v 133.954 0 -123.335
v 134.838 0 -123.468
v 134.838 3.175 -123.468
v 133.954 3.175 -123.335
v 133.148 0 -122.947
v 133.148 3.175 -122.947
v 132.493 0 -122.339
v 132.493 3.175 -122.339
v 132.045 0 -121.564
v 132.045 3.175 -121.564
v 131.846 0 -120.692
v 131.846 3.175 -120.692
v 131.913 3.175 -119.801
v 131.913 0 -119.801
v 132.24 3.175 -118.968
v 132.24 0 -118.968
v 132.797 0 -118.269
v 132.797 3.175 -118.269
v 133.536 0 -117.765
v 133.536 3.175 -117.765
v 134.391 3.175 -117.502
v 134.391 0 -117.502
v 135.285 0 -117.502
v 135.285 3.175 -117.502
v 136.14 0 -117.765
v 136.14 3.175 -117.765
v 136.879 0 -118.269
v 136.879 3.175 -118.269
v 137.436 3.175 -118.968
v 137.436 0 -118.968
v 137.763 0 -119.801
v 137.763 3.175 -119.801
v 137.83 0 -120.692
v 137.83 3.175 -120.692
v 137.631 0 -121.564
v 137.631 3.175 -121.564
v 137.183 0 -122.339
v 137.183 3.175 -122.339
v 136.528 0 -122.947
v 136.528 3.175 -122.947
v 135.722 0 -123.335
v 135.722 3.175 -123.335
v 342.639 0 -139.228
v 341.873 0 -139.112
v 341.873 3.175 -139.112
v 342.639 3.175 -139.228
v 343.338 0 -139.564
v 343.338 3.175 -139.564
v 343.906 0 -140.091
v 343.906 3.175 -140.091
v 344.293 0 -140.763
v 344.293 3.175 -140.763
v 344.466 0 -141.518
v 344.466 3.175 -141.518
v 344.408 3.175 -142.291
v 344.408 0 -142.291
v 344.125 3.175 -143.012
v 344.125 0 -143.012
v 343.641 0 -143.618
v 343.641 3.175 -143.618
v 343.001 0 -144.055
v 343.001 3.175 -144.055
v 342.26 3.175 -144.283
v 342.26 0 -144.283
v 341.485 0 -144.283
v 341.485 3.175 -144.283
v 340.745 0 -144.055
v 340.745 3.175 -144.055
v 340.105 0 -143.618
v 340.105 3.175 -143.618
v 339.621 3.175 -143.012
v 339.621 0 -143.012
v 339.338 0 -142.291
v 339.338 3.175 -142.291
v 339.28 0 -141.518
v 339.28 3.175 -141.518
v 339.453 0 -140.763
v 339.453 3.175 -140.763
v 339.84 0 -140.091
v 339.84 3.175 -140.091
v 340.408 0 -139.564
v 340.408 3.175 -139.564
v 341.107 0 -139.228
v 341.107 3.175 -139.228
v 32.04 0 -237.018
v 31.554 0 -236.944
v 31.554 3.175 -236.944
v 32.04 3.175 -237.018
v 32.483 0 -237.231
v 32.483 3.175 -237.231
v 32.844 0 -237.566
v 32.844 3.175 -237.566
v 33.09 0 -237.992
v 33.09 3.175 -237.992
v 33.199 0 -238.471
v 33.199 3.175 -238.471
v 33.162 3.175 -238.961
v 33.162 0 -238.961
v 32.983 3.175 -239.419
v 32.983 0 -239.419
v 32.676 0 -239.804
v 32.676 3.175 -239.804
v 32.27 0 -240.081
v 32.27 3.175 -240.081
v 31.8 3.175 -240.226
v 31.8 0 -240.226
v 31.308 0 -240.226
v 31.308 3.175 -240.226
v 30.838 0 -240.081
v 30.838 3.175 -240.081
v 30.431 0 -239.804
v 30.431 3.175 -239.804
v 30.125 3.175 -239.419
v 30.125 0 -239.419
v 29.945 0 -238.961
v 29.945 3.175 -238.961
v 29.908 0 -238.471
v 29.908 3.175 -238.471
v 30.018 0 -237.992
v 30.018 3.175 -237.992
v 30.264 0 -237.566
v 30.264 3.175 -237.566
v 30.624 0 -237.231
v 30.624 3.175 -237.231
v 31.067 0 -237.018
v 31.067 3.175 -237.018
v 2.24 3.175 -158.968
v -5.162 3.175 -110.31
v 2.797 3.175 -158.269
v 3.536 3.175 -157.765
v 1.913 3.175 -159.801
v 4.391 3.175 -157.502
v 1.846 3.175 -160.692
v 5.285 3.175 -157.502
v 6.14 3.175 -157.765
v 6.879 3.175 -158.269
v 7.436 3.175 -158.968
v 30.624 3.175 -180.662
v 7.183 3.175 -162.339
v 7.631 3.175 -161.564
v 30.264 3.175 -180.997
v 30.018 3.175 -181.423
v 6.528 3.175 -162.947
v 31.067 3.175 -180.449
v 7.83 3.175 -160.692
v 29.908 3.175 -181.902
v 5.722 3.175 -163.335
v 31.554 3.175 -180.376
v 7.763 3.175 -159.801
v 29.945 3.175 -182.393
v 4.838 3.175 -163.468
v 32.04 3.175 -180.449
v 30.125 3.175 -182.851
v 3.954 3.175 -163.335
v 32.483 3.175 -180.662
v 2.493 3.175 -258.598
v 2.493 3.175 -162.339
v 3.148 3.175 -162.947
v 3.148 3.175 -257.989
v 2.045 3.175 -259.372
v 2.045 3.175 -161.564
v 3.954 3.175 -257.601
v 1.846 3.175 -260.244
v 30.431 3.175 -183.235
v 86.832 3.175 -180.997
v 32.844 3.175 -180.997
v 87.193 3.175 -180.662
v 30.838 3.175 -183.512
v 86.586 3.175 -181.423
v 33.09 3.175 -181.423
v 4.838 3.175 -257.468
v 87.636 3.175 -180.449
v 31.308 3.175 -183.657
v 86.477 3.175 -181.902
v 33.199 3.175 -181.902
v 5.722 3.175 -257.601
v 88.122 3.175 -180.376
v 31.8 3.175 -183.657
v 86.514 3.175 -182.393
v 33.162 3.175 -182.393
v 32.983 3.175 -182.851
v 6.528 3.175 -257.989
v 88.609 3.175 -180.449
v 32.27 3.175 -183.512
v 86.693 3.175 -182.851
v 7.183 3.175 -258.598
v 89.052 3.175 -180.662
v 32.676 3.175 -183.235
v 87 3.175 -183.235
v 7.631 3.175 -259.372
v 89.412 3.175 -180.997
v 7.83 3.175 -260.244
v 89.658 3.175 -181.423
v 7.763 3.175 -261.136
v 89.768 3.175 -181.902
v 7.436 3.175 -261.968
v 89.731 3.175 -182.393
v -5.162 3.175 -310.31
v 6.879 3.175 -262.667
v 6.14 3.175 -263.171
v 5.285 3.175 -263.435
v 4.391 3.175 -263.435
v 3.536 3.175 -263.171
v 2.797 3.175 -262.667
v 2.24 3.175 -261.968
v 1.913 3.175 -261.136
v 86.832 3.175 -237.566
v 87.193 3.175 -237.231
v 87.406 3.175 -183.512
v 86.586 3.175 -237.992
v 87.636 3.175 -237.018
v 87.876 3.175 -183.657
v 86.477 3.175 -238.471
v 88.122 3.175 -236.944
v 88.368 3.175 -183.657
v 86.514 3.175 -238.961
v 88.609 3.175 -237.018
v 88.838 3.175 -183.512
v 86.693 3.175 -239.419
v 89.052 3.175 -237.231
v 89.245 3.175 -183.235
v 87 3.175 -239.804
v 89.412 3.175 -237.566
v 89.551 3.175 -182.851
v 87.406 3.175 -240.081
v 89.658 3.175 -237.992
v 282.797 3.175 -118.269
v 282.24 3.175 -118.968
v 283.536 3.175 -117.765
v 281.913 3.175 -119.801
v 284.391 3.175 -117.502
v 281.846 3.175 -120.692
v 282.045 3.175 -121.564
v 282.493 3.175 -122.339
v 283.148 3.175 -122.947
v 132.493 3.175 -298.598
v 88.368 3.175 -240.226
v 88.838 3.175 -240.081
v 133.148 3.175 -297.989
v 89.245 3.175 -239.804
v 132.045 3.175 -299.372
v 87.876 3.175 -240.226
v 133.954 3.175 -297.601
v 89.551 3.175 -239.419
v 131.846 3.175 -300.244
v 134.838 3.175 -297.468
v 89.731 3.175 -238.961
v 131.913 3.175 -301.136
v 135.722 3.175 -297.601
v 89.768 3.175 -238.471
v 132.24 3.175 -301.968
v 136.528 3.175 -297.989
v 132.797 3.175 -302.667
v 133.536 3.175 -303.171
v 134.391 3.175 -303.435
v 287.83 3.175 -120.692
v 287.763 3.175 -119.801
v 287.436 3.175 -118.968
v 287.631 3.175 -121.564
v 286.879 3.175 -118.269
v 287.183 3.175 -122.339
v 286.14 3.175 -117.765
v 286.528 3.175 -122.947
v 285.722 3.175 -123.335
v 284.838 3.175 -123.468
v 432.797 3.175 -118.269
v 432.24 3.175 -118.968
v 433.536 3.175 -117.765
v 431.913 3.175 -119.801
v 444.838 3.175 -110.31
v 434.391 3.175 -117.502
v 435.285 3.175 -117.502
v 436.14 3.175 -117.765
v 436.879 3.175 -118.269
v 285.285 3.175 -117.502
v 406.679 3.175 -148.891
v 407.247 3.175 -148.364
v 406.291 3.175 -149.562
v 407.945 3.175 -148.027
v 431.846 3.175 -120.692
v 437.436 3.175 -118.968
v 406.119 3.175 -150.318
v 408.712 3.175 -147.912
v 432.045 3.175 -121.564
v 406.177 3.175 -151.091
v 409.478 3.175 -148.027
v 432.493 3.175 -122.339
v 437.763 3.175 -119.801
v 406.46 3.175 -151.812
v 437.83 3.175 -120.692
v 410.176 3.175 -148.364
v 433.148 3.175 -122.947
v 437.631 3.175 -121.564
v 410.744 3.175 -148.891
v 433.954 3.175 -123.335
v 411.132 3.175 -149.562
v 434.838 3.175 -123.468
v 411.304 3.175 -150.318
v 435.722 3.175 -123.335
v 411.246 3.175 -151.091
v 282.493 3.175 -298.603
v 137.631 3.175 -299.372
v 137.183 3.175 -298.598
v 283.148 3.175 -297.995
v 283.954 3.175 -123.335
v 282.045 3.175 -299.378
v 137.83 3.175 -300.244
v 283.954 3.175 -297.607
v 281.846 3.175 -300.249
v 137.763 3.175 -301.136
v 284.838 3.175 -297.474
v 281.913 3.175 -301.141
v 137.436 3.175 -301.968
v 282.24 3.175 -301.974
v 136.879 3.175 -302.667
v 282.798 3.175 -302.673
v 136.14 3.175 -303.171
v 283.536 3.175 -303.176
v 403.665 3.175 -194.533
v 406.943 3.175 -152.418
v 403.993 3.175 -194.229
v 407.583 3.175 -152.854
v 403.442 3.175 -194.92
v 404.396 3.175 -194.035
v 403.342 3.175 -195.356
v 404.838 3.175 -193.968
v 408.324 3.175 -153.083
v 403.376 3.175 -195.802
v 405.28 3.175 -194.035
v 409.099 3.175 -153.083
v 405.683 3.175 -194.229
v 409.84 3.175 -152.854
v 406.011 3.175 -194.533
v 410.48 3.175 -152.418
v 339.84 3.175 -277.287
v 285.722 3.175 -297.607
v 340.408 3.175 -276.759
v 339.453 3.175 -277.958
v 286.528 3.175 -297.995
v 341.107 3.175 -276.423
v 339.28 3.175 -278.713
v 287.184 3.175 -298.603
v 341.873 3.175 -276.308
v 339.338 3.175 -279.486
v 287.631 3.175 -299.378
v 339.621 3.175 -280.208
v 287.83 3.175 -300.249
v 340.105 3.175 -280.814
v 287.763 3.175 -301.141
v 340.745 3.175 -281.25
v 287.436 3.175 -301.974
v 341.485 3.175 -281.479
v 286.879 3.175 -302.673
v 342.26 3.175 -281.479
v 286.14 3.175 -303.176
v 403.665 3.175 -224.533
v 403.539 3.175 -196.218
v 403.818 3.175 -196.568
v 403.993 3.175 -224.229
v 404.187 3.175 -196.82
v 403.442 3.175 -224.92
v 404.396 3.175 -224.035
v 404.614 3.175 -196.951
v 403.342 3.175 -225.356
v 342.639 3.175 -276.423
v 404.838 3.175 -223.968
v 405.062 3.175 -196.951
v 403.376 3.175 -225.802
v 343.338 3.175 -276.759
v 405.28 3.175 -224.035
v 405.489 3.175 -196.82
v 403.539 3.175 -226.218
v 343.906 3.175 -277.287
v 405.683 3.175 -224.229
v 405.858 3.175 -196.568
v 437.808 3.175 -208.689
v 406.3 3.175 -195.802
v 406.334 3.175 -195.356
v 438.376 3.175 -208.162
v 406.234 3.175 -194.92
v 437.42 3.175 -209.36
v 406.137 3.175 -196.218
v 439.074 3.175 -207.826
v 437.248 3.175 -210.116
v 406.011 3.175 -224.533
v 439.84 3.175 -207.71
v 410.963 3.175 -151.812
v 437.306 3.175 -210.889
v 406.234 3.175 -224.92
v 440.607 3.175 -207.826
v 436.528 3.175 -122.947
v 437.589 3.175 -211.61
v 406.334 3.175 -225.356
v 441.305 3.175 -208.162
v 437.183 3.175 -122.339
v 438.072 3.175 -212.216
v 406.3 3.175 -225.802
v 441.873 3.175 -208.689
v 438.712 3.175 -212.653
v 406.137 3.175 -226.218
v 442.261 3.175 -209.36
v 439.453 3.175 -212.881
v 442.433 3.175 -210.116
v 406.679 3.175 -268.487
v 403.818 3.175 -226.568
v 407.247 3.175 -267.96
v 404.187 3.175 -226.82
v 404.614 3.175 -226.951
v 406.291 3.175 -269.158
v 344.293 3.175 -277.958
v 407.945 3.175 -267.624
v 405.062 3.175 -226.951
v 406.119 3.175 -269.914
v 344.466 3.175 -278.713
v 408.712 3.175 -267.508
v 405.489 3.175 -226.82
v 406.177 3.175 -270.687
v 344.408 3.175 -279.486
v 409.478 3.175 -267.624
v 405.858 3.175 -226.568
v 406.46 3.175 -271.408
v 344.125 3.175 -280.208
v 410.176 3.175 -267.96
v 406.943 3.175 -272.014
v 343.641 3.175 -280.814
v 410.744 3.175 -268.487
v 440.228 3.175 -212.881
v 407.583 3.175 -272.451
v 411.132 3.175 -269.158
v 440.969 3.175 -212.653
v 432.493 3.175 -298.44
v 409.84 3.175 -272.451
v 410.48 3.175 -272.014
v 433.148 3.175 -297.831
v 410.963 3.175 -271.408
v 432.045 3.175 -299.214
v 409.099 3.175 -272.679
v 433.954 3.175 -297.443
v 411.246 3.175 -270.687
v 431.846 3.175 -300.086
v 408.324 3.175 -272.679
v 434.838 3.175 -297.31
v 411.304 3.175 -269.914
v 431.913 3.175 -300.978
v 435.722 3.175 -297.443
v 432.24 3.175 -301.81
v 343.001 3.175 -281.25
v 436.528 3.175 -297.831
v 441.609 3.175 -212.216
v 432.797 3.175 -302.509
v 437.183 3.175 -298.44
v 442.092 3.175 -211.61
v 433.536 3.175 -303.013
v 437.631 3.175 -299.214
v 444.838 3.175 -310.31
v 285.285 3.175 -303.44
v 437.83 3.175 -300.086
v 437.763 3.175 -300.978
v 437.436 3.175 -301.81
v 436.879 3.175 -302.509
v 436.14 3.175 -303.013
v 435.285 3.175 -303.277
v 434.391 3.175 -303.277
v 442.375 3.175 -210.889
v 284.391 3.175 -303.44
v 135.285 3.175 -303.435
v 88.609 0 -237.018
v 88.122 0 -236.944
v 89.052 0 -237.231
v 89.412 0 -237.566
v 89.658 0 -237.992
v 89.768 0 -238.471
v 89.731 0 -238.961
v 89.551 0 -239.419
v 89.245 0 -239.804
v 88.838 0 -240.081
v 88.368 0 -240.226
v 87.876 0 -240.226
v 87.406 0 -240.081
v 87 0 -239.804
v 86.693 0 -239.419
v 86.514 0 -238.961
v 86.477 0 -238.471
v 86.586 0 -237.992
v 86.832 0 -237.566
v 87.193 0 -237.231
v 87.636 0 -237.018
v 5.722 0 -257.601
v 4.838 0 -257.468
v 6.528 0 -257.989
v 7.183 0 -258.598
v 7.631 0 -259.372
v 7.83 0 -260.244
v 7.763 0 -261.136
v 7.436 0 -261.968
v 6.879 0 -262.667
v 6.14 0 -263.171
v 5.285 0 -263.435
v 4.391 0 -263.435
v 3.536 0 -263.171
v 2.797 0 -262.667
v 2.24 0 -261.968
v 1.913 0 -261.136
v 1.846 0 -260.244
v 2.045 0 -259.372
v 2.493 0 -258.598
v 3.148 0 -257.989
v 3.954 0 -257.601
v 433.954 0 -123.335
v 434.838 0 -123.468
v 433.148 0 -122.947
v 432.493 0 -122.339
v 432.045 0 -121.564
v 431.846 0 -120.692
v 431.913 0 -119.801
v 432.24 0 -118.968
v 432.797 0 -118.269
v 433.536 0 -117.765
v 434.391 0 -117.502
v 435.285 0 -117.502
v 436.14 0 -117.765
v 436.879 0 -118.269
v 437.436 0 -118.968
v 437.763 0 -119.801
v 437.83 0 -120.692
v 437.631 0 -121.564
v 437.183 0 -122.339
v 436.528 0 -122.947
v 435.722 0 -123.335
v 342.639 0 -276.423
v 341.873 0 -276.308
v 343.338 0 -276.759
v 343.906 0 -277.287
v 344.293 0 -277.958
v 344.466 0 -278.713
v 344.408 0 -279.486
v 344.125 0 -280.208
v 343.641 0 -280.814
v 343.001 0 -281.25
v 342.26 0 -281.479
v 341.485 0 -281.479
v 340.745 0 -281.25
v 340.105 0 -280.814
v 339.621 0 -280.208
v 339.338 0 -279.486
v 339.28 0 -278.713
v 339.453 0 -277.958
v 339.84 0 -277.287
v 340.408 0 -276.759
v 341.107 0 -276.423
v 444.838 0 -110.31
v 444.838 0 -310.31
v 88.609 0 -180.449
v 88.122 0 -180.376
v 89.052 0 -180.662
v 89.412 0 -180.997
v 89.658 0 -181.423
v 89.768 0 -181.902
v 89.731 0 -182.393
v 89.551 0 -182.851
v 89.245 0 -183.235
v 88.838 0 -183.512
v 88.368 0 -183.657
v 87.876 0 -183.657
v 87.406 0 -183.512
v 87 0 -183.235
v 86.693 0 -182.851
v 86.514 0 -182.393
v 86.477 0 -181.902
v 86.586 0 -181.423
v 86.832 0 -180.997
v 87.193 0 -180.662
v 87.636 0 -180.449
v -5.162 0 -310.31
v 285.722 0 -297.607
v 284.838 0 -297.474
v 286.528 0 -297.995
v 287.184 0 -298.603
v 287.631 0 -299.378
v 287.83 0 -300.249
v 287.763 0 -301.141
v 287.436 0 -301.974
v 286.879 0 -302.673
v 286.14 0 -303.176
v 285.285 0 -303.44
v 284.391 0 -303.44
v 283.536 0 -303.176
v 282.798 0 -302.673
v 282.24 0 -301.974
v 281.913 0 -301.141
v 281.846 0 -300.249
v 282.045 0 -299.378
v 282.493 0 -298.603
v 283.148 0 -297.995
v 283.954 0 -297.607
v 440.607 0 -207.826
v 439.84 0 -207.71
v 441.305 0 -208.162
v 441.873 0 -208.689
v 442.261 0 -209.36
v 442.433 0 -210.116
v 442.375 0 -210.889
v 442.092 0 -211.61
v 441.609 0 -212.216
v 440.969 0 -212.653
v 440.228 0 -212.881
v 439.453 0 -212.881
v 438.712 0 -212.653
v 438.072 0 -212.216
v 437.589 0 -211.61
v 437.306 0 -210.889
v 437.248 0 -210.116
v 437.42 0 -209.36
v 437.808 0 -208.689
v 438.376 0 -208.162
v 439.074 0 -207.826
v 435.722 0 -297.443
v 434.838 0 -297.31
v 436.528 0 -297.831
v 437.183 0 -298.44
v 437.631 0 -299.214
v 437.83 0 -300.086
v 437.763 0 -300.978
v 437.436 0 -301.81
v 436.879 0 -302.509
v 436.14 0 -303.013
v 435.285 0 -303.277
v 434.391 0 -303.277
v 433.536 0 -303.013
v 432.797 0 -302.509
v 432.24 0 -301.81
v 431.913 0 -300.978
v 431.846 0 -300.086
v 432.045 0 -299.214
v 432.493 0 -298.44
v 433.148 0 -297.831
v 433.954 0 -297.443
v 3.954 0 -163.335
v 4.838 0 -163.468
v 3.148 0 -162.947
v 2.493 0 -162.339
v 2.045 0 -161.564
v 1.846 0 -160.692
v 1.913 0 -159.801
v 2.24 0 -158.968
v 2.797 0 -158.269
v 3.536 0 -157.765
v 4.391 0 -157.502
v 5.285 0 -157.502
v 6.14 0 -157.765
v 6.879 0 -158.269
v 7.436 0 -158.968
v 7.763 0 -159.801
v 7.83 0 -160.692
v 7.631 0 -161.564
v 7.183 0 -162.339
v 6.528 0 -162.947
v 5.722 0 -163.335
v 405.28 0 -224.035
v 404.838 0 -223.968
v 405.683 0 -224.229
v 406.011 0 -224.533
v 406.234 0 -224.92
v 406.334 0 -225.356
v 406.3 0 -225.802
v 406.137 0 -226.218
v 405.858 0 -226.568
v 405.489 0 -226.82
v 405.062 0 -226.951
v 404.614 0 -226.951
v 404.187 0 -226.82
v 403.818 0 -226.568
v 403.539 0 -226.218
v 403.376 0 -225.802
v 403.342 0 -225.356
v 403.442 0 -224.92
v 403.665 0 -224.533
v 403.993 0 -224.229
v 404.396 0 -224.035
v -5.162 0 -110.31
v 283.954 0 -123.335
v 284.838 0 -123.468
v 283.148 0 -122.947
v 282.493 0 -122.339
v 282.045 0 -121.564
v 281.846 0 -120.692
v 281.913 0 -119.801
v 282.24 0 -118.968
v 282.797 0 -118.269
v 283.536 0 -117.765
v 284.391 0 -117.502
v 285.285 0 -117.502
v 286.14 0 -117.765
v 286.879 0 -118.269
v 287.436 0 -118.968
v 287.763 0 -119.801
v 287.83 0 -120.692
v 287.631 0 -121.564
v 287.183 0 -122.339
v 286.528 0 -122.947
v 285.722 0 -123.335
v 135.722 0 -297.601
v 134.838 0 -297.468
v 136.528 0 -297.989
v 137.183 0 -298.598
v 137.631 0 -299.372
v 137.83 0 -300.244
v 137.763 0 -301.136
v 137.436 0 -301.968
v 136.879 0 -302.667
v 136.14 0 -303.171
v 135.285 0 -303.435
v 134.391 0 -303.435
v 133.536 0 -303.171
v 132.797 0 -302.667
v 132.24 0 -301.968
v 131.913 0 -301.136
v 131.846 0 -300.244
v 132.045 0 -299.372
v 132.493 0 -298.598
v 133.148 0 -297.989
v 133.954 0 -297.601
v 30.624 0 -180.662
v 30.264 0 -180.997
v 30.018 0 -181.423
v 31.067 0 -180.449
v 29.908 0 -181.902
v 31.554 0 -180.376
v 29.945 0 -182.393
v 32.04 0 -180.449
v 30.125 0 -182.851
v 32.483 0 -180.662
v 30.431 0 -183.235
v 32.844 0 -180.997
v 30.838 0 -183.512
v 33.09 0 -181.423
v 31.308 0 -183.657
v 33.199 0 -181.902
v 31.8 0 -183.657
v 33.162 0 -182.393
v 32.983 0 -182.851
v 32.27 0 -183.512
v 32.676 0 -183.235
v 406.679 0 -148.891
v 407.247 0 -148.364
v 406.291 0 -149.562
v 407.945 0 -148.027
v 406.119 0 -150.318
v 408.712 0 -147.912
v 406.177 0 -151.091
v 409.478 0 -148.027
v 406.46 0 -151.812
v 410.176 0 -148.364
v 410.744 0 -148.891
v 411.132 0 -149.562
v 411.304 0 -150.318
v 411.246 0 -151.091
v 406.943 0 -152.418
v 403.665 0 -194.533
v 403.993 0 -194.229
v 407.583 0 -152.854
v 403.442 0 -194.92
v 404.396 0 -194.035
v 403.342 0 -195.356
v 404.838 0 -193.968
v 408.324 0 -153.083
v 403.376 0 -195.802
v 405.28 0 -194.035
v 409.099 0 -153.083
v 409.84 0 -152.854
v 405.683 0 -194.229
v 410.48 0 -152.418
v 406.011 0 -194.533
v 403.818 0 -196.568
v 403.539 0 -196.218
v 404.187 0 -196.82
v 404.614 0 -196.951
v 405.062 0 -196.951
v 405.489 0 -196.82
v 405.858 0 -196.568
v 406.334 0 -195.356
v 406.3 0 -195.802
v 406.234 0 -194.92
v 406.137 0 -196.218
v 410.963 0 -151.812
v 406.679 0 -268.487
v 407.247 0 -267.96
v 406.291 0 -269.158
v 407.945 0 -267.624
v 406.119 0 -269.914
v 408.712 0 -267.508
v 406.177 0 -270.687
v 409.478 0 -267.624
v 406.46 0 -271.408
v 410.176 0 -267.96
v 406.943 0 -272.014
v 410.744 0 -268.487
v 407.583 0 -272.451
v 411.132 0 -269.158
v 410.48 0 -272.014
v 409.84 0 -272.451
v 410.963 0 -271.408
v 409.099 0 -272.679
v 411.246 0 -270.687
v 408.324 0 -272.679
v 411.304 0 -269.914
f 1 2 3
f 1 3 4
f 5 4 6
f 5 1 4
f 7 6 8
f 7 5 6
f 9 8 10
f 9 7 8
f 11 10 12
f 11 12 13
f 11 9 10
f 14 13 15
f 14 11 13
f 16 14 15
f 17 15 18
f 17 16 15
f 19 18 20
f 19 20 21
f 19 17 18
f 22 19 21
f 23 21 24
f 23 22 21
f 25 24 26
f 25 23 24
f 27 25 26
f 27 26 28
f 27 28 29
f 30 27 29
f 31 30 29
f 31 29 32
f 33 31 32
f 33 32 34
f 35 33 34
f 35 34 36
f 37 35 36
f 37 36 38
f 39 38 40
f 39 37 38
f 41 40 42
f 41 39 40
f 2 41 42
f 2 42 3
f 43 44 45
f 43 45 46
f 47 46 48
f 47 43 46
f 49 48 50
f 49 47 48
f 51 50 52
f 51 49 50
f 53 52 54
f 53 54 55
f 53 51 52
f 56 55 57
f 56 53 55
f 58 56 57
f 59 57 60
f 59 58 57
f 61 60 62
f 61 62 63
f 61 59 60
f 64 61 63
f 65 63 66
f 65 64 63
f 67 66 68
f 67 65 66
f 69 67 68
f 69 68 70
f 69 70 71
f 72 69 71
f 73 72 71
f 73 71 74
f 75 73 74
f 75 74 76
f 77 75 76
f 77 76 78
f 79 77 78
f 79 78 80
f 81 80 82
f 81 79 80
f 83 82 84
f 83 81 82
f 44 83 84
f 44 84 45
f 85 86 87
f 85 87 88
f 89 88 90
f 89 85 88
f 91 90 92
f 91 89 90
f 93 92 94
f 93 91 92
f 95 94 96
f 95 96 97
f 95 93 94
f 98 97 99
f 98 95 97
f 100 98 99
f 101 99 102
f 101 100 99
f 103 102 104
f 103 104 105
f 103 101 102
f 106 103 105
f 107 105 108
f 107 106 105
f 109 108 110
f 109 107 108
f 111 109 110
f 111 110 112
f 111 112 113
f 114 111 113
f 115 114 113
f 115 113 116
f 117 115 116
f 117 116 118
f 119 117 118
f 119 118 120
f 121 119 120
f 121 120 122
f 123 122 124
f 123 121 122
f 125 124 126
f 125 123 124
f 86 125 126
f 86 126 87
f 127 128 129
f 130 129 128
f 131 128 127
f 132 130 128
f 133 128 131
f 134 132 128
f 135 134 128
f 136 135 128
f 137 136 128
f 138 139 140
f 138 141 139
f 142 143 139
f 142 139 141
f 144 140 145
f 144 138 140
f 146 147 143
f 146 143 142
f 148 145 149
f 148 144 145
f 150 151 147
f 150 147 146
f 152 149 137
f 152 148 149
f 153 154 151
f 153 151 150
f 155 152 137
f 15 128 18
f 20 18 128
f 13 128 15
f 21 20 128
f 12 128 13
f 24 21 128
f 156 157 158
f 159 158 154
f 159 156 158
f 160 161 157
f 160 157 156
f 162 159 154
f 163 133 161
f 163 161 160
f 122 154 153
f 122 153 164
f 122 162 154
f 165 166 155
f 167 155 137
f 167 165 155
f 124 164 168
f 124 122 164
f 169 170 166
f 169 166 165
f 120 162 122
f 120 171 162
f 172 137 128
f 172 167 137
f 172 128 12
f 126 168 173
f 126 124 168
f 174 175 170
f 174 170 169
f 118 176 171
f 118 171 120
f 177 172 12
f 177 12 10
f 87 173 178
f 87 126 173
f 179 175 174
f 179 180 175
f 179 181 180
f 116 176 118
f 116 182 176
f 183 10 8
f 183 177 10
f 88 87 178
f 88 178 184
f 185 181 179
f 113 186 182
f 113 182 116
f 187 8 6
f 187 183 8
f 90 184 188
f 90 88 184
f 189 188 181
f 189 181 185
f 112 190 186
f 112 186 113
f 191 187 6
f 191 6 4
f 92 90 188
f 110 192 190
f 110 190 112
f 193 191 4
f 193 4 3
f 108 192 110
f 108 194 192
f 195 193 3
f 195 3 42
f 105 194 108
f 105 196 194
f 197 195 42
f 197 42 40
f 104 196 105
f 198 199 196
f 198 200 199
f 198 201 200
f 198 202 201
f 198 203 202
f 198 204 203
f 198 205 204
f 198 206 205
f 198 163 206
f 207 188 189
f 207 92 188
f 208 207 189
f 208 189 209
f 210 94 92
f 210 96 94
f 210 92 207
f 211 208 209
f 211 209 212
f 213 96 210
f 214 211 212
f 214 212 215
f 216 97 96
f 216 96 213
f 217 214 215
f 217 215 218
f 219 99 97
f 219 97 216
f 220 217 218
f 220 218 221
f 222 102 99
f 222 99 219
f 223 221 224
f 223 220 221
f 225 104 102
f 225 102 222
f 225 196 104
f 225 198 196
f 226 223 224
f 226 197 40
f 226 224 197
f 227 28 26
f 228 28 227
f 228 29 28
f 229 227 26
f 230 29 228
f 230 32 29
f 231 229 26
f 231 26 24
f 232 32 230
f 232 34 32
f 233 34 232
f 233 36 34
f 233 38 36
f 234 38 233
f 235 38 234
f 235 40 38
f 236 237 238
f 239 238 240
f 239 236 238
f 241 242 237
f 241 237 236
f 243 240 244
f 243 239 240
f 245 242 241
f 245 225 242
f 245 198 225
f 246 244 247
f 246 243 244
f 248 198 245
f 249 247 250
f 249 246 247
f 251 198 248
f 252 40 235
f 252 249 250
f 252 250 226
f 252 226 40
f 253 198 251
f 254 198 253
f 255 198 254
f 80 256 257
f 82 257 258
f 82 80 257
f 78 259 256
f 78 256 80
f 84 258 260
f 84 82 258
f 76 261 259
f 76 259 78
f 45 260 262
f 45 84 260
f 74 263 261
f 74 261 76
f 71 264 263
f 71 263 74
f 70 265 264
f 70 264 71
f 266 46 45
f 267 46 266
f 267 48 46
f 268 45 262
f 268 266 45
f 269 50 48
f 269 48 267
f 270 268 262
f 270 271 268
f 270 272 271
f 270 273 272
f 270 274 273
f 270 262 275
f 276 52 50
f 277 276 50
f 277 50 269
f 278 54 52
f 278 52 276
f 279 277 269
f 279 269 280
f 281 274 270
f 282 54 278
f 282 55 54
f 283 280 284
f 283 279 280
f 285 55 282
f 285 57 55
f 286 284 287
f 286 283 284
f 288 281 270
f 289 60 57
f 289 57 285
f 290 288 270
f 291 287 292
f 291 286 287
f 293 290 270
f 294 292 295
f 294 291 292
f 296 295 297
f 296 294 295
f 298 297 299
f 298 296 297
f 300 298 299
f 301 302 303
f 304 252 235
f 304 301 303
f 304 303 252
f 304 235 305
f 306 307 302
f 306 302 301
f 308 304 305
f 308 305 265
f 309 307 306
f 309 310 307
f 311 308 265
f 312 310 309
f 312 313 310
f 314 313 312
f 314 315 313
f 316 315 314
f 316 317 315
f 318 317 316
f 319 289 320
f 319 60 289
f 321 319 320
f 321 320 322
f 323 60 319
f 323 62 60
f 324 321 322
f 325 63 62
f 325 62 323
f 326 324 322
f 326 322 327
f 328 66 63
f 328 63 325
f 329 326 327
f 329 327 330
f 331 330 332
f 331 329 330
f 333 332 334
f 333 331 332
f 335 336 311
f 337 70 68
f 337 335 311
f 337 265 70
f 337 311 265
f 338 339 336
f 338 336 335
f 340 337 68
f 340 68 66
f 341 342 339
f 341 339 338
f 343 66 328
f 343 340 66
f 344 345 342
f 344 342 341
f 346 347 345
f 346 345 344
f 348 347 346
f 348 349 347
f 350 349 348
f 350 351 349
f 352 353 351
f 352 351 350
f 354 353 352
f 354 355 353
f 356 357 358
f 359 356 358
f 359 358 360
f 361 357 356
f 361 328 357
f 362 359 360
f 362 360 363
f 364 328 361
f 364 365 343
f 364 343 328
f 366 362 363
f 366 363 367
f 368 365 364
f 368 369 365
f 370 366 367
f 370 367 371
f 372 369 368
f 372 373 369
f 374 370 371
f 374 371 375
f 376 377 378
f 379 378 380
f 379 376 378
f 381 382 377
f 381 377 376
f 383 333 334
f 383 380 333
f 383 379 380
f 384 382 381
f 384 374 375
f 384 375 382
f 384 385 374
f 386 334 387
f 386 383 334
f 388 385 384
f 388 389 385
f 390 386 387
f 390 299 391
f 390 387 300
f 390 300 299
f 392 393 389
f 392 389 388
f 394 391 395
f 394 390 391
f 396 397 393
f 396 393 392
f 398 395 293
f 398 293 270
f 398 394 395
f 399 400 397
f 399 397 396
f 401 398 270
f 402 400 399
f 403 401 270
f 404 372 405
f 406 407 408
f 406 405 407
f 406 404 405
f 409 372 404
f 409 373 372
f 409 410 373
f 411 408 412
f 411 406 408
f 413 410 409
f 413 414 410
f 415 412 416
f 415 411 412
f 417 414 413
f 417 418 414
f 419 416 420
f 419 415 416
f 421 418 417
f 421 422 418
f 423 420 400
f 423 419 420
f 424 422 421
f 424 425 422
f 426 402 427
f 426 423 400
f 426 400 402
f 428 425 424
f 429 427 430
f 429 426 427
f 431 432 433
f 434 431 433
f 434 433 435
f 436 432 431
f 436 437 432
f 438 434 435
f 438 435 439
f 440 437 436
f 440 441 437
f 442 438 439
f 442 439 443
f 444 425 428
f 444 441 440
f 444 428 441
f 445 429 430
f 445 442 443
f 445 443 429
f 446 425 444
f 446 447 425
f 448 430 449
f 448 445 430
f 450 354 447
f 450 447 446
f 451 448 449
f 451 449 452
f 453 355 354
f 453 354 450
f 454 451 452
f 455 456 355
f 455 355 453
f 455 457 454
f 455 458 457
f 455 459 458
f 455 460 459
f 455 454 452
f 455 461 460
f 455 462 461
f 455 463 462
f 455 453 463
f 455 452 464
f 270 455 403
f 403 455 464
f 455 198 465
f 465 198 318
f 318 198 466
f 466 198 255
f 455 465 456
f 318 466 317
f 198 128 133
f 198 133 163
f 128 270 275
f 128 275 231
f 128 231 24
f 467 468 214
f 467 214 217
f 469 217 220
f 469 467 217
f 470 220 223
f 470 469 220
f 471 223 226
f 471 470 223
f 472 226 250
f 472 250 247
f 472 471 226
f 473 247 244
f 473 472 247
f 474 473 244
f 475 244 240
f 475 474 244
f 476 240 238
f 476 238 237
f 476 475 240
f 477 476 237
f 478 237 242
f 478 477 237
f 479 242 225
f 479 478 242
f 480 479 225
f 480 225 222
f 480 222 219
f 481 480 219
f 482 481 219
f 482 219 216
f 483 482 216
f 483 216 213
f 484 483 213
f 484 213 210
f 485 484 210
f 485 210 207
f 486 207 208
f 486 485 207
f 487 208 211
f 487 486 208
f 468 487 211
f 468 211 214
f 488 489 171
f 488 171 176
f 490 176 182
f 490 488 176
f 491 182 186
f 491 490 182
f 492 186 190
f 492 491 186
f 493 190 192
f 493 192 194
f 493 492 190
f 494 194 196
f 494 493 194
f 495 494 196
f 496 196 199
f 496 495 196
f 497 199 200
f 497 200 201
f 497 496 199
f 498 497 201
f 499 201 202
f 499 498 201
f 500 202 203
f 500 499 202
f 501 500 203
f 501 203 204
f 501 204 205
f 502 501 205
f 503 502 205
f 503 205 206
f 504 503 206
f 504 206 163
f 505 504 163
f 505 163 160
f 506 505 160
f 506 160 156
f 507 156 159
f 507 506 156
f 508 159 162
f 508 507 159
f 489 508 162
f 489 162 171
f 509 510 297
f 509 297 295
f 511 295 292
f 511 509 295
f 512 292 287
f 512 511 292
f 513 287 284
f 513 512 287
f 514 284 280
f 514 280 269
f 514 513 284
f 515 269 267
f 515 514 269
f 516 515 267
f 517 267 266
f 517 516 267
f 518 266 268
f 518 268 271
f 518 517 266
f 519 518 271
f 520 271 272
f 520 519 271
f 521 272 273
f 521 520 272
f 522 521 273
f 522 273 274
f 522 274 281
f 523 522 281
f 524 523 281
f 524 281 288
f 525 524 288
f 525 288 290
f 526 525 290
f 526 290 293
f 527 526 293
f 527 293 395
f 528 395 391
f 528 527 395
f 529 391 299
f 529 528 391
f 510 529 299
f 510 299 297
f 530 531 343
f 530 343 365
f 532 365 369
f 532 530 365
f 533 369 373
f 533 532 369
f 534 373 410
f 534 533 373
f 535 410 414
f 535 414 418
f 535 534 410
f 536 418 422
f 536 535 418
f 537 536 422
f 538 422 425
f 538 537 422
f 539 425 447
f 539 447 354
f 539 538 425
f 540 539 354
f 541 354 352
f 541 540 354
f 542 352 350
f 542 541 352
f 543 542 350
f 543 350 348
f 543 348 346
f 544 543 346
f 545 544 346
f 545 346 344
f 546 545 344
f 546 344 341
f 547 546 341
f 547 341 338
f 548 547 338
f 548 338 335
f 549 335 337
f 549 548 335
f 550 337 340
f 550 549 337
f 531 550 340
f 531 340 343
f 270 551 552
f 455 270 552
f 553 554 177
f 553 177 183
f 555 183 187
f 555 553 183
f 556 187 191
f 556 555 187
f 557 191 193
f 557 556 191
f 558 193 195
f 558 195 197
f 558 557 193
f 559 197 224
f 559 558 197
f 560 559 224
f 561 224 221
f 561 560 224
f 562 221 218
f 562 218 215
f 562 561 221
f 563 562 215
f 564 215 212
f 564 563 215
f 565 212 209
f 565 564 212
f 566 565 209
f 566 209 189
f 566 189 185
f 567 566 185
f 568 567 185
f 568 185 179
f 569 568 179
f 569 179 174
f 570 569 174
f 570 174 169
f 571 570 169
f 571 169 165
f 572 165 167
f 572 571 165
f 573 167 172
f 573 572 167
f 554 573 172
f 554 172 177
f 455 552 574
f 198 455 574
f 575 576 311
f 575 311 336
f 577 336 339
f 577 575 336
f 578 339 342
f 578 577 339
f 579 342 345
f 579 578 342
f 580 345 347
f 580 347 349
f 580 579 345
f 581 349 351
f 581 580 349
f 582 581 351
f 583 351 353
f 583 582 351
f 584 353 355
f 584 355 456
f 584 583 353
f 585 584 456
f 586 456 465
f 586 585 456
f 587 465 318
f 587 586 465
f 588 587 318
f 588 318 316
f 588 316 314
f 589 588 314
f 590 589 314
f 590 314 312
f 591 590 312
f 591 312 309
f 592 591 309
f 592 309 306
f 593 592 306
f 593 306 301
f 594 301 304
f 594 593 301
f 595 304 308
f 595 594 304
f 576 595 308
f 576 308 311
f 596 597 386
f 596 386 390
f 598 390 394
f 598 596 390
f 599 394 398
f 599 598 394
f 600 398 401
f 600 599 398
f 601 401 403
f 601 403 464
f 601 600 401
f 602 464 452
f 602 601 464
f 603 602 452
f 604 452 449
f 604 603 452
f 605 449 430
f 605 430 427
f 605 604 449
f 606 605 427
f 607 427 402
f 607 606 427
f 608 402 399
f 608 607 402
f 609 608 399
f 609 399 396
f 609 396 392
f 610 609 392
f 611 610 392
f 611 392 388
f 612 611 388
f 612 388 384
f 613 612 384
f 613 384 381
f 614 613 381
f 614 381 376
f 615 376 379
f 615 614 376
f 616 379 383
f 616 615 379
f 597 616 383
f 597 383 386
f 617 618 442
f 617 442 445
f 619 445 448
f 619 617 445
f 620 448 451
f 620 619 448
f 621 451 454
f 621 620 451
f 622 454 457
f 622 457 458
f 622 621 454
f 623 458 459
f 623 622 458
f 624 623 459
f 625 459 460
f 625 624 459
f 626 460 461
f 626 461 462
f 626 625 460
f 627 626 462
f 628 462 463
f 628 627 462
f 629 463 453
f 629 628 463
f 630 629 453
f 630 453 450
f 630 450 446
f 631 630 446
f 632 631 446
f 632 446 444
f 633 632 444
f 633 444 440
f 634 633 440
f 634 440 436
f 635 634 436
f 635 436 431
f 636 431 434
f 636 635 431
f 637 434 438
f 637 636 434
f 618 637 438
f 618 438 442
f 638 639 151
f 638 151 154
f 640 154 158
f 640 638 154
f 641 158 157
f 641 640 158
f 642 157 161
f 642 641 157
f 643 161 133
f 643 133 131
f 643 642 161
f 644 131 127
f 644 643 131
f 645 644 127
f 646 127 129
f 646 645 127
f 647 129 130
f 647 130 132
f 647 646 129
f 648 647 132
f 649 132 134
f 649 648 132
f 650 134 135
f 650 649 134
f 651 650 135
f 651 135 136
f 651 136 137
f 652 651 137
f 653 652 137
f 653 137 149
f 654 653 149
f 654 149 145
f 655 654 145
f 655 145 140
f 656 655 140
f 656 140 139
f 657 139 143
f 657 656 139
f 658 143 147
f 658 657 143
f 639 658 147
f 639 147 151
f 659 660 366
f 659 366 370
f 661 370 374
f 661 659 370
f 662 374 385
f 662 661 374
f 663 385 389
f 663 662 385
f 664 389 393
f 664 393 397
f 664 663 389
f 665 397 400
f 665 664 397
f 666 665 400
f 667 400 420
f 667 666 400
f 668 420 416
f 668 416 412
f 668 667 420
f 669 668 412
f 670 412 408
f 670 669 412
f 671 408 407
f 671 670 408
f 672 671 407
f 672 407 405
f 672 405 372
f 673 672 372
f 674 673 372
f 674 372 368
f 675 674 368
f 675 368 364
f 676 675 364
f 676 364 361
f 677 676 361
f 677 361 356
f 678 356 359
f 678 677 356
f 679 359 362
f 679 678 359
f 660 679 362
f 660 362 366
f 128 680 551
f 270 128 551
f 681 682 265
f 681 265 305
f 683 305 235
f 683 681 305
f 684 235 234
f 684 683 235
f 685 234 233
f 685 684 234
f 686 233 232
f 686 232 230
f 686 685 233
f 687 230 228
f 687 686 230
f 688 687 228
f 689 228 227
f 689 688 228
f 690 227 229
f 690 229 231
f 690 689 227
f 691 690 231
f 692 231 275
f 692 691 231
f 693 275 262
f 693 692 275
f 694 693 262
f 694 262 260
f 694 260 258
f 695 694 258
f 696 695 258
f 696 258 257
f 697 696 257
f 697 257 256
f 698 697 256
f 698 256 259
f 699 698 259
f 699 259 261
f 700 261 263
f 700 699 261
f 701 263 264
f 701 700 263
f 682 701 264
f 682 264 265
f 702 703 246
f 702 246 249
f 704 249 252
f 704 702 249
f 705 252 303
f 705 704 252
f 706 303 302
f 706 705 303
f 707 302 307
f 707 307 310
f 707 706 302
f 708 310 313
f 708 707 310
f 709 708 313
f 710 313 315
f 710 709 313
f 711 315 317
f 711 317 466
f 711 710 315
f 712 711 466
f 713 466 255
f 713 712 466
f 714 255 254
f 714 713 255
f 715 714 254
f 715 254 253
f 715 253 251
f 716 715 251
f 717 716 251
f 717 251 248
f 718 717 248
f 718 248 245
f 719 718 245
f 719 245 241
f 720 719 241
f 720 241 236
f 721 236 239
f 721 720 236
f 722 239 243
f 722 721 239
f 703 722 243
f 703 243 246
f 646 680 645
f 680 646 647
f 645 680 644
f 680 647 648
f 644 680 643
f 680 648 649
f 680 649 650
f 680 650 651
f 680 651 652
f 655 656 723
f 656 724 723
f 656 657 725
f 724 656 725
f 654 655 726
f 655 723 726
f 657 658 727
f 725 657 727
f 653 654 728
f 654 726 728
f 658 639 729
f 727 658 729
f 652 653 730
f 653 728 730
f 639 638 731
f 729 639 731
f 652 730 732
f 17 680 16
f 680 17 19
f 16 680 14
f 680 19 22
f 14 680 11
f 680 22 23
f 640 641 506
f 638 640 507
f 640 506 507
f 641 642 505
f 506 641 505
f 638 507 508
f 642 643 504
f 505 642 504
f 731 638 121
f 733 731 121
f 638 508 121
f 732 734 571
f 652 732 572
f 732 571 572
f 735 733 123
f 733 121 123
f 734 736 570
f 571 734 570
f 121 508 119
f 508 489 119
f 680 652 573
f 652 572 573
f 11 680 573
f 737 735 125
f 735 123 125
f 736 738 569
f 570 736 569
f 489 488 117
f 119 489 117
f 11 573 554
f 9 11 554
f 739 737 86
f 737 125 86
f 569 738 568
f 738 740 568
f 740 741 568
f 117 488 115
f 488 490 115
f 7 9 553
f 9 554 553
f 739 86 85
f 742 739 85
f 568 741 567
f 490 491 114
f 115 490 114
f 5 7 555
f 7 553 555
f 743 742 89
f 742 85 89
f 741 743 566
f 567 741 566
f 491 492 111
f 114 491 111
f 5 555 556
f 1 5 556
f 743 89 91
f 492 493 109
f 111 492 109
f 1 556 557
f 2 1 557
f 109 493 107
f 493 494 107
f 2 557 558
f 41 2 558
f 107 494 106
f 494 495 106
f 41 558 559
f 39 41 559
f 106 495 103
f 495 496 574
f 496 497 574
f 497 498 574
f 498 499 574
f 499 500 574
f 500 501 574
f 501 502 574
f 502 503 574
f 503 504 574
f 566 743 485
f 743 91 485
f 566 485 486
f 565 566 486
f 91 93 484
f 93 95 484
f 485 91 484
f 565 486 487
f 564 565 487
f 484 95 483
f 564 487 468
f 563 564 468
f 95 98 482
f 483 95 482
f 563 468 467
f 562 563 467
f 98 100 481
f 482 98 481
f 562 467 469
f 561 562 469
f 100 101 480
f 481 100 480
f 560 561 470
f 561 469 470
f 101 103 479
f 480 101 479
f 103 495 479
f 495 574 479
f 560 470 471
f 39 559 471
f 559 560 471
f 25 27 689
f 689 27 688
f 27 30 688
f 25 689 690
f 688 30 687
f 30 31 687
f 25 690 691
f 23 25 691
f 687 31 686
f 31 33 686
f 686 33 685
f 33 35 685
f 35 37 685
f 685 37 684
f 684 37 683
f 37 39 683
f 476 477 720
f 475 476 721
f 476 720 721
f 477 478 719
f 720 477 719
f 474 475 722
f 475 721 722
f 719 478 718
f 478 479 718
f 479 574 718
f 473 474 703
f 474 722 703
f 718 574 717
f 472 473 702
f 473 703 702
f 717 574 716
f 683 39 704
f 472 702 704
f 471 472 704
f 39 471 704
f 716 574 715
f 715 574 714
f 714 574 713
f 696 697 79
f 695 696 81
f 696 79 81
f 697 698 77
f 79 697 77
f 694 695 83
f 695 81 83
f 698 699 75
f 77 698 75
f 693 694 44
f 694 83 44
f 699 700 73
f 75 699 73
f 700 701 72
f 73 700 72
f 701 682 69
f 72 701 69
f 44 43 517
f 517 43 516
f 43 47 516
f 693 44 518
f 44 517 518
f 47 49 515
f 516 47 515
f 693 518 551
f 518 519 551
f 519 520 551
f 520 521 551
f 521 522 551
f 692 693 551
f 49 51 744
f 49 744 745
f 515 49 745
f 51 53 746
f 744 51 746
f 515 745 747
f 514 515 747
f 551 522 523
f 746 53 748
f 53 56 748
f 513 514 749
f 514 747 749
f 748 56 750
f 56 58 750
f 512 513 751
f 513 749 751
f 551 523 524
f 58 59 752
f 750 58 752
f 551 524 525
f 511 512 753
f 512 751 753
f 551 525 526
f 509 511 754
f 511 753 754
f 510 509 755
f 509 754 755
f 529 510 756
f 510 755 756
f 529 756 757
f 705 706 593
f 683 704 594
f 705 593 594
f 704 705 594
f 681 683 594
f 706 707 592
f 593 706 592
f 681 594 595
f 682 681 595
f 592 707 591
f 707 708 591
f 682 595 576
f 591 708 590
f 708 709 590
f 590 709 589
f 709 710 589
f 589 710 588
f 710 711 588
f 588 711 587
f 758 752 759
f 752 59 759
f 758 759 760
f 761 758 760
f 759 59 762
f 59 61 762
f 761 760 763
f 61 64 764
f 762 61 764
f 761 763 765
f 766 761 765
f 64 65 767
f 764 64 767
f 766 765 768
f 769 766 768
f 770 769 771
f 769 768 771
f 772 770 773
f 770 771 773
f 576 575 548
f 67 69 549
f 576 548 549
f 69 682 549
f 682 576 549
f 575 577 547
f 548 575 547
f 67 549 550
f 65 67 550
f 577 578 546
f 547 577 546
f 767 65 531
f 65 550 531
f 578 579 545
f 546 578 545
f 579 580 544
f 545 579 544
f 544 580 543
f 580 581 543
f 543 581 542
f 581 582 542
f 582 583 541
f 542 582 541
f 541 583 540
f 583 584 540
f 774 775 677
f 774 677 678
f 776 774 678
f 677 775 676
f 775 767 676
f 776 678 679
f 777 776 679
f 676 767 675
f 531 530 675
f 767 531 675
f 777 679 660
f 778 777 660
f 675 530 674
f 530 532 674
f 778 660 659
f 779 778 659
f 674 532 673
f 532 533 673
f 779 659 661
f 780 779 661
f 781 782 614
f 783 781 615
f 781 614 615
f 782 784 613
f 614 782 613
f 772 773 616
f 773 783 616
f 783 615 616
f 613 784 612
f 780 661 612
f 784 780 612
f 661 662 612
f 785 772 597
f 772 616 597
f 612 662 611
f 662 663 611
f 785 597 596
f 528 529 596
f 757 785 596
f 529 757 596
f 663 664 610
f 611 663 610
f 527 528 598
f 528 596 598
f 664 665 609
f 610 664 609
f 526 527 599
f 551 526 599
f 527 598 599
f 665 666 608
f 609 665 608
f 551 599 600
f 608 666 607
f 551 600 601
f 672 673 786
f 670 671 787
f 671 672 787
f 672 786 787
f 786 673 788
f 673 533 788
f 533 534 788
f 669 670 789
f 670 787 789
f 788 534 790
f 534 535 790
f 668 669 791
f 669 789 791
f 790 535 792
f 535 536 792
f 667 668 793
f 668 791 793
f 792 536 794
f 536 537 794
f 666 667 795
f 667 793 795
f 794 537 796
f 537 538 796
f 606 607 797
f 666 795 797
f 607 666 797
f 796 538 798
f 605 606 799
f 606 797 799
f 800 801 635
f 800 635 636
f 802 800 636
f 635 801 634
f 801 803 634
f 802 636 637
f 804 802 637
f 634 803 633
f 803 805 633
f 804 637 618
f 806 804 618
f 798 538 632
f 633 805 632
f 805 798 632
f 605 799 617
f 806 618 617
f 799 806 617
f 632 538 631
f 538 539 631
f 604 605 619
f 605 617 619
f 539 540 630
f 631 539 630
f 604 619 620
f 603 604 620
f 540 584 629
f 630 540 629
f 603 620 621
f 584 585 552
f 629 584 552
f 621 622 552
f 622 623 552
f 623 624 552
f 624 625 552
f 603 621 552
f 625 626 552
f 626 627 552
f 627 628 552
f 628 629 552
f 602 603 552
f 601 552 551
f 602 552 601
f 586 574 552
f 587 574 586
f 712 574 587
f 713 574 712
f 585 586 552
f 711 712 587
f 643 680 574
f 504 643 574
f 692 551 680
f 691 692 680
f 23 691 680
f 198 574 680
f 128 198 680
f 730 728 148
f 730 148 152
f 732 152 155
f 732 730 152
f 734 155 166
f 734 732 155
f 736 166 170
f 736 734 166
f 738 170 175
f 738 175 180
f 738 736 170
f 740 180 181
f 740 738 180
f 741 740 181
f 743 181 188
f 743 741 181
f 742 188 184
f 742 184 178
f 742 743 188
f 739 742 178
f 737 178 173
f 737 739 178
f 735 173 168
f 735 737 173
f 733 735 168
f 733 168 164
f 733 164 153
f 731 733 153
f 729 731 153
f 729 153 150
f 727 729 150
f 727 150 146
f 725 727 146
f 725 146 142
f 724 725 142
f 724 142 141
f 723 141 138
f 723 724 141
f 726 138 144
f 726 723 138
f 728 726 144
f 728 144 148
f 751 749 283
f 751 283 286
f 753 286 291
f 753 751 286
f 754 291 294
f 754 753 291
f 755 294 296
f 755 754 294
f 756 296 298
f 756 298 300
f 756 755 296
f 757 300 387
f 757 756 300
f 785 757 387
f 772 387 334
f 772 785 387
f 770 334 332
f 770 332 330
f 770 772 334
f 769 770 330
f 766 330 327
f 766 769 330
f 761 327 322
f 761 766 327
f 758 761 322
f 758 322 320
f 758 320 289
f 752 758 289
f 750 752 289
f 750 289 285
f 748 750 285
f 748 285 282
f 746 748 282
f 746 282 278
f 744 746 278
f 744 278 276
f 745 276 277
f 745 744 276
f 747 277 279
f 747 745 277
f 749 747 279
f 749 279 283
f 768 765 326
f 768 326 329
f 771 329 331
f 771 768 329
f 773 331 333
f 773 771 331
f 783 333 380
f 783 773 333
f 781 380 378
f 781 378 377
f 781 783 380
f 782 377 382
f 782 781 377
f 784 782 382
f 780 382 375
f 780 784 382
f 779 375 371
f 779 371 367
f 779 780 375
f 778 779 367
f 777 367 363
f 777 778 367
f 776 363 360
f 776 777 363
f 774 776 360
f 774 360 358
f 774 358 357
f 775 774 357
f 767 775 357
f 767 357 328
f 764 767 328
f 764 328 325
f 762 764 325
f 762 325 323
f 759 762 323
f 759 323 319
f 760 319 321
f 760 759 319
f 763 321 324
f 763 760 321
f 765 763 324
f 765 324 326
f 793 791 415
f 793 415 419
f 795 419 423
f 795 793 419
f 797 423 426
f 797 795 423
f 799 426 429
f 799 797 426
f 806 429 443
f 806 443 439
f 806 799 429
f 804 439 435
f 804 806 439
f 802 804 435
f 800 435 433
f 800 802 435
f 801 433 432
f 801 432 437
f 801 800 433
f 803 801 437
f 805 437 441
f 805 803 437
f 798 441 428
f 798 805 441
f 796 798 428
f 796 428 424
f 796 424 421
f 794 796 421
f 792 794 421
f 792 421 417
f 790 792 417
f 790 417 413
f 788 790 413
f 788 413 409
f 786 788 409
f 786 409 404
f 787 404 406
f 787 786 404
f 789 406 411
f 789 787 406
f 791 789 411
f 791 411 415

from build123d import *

# Parameters (mm, degrees)
SKETCH1_R           = 1.5
SKETCH1_R_2         = 3
SKETCH1_R_3         = 2.6
SKETCH1_R_4         = 1.65
BOSS_EXTRUDE1_DEPTH = 3.175


with BuildPart() as part:
    # Sketch1 → Boss-Extrude1 (new body)
    with BuildSketch(Plane(origin=(0, 0, 0), x_dir=(1, 0, 0), z_dir=(0, 1, 0))):
        Polygon((64.838003204, 110.310049741), (444.838003204, 110.310049741), (444.838003204, 310.310049741), (69.838003204, 310.310049741), (-5.161996796, 310.310049741), (-5.161996796, 110.310049741), align=None)
        with Locations(Location((404.838003204, 225.468098835, 0), (0, 0, 270))):
            Circle(SKETCH1_R, mode=Mode.SUBTRACT)
        with Locations(Location((404.838003204, 195.468098835, 0), (0, 0, 270))):
            Circle(SKETCH1_R, mode=Mode.SUBTRACT)
        with Locations(Location((4.838003204, 260.468098835, 0), (0, 0, 270))):
            Circle(SKETCH1_R_2, mode=Mode.SUBTRACT)
        with Locations(Location((434.838003204, 300.310049741, 0), (0, 0, 270))):
            Circle(SKETCH1_R_2, mode=Mode.SUBTRACT)
        with Locations(Location((134.838003204, 300.468098835, 0), (0, 0, 270))):
            Circle(SKETCH1_R_2, mode=Mode.SUBTRACT)
        with Locations(Location((284.83809231, 300.473548709, 0), (0, 0, 270))):
            Circle(SKETCH1_R_2, mode=Mode.SUBTRACT)
        with Locations(Location((434.838003204, 120.468098835, 0), (0, 0, 90))):
            Circle(SKETCH1_R_2, mode=Mode.SUBTRACT)
        with Locations(Location((284.838003204, 120.468098835, 0), (0, 0, 90))):
            Circle(SKETCH1_R_2, mode=Mode.SUBTRACT)
        with Locations(Location((134.838003204, 120.468098835, 0), (0, 0, 90))):
            Circle(SKETCH1_R_2, mode=Mode.SUBTRACT)
        with Locations(Location((4.838003204, 160.468098835, 0), (0, 0, 90))):
            Circle(SKETCH1_R_2, mode=Mode.SUBTRACT)
        with Locations(Location((439.840442188, 210.310049741, 0), (0, 0, 270))):
            Circle(SKETCH1_R_3, mode=Mode.SUBTRACT)
        with Locations(Location((408.71152183, 150.511950619, 0), (0, 0, 270))):
            Circle(SKETCH1_R_3, mode=Mode.SUBTRACT)
        with Locations(Location((341.872971694, 141.712488661, 0), (0, 0, 270))):
            Circle(SKETCH1_R_3, mode=Mode.SUBTRACT)
        with Locations(Location((408.711522042, 270.108148975, 0), (0, 0, 270))):
            Circle(SKETCH1_R_3, mode=Mode.SUBTRACT)
        with Locations(Location((341.872971726, 278.907611059, 0), (0, 0, 270))):
            Circle(SKETCH1_R_3, mode=Mode.SUBTRACT)
        with Locations(Location((31.553731956, 238.594320989, 0), (0, 0, 270))):
            Circle(SKETCH1_R_4, mode=Mode.SUBTRACT)
        with Locations(Location((88.122274451, 238.594320989, 0), (0, 0, 270))):
            Circle(SKETCH1_R_4, mode=Mode.SUBTRACT)
        with Locations(Location((88.122274451, 182.025778494, 0), (0, 0, 270))):
            Circle(SKETCH1_R_4, mode=Mode.SUBTRACT)
        with Locations(Location((31.553731956, 182.025778494, 0), (0, 0, 270))):
            Circle(SKETCH1_R_4, mode=Mode.SUBTRACT)
    extrude(amount=BOSS_EXTRUDE1_DEPTH)


solid = part.part
